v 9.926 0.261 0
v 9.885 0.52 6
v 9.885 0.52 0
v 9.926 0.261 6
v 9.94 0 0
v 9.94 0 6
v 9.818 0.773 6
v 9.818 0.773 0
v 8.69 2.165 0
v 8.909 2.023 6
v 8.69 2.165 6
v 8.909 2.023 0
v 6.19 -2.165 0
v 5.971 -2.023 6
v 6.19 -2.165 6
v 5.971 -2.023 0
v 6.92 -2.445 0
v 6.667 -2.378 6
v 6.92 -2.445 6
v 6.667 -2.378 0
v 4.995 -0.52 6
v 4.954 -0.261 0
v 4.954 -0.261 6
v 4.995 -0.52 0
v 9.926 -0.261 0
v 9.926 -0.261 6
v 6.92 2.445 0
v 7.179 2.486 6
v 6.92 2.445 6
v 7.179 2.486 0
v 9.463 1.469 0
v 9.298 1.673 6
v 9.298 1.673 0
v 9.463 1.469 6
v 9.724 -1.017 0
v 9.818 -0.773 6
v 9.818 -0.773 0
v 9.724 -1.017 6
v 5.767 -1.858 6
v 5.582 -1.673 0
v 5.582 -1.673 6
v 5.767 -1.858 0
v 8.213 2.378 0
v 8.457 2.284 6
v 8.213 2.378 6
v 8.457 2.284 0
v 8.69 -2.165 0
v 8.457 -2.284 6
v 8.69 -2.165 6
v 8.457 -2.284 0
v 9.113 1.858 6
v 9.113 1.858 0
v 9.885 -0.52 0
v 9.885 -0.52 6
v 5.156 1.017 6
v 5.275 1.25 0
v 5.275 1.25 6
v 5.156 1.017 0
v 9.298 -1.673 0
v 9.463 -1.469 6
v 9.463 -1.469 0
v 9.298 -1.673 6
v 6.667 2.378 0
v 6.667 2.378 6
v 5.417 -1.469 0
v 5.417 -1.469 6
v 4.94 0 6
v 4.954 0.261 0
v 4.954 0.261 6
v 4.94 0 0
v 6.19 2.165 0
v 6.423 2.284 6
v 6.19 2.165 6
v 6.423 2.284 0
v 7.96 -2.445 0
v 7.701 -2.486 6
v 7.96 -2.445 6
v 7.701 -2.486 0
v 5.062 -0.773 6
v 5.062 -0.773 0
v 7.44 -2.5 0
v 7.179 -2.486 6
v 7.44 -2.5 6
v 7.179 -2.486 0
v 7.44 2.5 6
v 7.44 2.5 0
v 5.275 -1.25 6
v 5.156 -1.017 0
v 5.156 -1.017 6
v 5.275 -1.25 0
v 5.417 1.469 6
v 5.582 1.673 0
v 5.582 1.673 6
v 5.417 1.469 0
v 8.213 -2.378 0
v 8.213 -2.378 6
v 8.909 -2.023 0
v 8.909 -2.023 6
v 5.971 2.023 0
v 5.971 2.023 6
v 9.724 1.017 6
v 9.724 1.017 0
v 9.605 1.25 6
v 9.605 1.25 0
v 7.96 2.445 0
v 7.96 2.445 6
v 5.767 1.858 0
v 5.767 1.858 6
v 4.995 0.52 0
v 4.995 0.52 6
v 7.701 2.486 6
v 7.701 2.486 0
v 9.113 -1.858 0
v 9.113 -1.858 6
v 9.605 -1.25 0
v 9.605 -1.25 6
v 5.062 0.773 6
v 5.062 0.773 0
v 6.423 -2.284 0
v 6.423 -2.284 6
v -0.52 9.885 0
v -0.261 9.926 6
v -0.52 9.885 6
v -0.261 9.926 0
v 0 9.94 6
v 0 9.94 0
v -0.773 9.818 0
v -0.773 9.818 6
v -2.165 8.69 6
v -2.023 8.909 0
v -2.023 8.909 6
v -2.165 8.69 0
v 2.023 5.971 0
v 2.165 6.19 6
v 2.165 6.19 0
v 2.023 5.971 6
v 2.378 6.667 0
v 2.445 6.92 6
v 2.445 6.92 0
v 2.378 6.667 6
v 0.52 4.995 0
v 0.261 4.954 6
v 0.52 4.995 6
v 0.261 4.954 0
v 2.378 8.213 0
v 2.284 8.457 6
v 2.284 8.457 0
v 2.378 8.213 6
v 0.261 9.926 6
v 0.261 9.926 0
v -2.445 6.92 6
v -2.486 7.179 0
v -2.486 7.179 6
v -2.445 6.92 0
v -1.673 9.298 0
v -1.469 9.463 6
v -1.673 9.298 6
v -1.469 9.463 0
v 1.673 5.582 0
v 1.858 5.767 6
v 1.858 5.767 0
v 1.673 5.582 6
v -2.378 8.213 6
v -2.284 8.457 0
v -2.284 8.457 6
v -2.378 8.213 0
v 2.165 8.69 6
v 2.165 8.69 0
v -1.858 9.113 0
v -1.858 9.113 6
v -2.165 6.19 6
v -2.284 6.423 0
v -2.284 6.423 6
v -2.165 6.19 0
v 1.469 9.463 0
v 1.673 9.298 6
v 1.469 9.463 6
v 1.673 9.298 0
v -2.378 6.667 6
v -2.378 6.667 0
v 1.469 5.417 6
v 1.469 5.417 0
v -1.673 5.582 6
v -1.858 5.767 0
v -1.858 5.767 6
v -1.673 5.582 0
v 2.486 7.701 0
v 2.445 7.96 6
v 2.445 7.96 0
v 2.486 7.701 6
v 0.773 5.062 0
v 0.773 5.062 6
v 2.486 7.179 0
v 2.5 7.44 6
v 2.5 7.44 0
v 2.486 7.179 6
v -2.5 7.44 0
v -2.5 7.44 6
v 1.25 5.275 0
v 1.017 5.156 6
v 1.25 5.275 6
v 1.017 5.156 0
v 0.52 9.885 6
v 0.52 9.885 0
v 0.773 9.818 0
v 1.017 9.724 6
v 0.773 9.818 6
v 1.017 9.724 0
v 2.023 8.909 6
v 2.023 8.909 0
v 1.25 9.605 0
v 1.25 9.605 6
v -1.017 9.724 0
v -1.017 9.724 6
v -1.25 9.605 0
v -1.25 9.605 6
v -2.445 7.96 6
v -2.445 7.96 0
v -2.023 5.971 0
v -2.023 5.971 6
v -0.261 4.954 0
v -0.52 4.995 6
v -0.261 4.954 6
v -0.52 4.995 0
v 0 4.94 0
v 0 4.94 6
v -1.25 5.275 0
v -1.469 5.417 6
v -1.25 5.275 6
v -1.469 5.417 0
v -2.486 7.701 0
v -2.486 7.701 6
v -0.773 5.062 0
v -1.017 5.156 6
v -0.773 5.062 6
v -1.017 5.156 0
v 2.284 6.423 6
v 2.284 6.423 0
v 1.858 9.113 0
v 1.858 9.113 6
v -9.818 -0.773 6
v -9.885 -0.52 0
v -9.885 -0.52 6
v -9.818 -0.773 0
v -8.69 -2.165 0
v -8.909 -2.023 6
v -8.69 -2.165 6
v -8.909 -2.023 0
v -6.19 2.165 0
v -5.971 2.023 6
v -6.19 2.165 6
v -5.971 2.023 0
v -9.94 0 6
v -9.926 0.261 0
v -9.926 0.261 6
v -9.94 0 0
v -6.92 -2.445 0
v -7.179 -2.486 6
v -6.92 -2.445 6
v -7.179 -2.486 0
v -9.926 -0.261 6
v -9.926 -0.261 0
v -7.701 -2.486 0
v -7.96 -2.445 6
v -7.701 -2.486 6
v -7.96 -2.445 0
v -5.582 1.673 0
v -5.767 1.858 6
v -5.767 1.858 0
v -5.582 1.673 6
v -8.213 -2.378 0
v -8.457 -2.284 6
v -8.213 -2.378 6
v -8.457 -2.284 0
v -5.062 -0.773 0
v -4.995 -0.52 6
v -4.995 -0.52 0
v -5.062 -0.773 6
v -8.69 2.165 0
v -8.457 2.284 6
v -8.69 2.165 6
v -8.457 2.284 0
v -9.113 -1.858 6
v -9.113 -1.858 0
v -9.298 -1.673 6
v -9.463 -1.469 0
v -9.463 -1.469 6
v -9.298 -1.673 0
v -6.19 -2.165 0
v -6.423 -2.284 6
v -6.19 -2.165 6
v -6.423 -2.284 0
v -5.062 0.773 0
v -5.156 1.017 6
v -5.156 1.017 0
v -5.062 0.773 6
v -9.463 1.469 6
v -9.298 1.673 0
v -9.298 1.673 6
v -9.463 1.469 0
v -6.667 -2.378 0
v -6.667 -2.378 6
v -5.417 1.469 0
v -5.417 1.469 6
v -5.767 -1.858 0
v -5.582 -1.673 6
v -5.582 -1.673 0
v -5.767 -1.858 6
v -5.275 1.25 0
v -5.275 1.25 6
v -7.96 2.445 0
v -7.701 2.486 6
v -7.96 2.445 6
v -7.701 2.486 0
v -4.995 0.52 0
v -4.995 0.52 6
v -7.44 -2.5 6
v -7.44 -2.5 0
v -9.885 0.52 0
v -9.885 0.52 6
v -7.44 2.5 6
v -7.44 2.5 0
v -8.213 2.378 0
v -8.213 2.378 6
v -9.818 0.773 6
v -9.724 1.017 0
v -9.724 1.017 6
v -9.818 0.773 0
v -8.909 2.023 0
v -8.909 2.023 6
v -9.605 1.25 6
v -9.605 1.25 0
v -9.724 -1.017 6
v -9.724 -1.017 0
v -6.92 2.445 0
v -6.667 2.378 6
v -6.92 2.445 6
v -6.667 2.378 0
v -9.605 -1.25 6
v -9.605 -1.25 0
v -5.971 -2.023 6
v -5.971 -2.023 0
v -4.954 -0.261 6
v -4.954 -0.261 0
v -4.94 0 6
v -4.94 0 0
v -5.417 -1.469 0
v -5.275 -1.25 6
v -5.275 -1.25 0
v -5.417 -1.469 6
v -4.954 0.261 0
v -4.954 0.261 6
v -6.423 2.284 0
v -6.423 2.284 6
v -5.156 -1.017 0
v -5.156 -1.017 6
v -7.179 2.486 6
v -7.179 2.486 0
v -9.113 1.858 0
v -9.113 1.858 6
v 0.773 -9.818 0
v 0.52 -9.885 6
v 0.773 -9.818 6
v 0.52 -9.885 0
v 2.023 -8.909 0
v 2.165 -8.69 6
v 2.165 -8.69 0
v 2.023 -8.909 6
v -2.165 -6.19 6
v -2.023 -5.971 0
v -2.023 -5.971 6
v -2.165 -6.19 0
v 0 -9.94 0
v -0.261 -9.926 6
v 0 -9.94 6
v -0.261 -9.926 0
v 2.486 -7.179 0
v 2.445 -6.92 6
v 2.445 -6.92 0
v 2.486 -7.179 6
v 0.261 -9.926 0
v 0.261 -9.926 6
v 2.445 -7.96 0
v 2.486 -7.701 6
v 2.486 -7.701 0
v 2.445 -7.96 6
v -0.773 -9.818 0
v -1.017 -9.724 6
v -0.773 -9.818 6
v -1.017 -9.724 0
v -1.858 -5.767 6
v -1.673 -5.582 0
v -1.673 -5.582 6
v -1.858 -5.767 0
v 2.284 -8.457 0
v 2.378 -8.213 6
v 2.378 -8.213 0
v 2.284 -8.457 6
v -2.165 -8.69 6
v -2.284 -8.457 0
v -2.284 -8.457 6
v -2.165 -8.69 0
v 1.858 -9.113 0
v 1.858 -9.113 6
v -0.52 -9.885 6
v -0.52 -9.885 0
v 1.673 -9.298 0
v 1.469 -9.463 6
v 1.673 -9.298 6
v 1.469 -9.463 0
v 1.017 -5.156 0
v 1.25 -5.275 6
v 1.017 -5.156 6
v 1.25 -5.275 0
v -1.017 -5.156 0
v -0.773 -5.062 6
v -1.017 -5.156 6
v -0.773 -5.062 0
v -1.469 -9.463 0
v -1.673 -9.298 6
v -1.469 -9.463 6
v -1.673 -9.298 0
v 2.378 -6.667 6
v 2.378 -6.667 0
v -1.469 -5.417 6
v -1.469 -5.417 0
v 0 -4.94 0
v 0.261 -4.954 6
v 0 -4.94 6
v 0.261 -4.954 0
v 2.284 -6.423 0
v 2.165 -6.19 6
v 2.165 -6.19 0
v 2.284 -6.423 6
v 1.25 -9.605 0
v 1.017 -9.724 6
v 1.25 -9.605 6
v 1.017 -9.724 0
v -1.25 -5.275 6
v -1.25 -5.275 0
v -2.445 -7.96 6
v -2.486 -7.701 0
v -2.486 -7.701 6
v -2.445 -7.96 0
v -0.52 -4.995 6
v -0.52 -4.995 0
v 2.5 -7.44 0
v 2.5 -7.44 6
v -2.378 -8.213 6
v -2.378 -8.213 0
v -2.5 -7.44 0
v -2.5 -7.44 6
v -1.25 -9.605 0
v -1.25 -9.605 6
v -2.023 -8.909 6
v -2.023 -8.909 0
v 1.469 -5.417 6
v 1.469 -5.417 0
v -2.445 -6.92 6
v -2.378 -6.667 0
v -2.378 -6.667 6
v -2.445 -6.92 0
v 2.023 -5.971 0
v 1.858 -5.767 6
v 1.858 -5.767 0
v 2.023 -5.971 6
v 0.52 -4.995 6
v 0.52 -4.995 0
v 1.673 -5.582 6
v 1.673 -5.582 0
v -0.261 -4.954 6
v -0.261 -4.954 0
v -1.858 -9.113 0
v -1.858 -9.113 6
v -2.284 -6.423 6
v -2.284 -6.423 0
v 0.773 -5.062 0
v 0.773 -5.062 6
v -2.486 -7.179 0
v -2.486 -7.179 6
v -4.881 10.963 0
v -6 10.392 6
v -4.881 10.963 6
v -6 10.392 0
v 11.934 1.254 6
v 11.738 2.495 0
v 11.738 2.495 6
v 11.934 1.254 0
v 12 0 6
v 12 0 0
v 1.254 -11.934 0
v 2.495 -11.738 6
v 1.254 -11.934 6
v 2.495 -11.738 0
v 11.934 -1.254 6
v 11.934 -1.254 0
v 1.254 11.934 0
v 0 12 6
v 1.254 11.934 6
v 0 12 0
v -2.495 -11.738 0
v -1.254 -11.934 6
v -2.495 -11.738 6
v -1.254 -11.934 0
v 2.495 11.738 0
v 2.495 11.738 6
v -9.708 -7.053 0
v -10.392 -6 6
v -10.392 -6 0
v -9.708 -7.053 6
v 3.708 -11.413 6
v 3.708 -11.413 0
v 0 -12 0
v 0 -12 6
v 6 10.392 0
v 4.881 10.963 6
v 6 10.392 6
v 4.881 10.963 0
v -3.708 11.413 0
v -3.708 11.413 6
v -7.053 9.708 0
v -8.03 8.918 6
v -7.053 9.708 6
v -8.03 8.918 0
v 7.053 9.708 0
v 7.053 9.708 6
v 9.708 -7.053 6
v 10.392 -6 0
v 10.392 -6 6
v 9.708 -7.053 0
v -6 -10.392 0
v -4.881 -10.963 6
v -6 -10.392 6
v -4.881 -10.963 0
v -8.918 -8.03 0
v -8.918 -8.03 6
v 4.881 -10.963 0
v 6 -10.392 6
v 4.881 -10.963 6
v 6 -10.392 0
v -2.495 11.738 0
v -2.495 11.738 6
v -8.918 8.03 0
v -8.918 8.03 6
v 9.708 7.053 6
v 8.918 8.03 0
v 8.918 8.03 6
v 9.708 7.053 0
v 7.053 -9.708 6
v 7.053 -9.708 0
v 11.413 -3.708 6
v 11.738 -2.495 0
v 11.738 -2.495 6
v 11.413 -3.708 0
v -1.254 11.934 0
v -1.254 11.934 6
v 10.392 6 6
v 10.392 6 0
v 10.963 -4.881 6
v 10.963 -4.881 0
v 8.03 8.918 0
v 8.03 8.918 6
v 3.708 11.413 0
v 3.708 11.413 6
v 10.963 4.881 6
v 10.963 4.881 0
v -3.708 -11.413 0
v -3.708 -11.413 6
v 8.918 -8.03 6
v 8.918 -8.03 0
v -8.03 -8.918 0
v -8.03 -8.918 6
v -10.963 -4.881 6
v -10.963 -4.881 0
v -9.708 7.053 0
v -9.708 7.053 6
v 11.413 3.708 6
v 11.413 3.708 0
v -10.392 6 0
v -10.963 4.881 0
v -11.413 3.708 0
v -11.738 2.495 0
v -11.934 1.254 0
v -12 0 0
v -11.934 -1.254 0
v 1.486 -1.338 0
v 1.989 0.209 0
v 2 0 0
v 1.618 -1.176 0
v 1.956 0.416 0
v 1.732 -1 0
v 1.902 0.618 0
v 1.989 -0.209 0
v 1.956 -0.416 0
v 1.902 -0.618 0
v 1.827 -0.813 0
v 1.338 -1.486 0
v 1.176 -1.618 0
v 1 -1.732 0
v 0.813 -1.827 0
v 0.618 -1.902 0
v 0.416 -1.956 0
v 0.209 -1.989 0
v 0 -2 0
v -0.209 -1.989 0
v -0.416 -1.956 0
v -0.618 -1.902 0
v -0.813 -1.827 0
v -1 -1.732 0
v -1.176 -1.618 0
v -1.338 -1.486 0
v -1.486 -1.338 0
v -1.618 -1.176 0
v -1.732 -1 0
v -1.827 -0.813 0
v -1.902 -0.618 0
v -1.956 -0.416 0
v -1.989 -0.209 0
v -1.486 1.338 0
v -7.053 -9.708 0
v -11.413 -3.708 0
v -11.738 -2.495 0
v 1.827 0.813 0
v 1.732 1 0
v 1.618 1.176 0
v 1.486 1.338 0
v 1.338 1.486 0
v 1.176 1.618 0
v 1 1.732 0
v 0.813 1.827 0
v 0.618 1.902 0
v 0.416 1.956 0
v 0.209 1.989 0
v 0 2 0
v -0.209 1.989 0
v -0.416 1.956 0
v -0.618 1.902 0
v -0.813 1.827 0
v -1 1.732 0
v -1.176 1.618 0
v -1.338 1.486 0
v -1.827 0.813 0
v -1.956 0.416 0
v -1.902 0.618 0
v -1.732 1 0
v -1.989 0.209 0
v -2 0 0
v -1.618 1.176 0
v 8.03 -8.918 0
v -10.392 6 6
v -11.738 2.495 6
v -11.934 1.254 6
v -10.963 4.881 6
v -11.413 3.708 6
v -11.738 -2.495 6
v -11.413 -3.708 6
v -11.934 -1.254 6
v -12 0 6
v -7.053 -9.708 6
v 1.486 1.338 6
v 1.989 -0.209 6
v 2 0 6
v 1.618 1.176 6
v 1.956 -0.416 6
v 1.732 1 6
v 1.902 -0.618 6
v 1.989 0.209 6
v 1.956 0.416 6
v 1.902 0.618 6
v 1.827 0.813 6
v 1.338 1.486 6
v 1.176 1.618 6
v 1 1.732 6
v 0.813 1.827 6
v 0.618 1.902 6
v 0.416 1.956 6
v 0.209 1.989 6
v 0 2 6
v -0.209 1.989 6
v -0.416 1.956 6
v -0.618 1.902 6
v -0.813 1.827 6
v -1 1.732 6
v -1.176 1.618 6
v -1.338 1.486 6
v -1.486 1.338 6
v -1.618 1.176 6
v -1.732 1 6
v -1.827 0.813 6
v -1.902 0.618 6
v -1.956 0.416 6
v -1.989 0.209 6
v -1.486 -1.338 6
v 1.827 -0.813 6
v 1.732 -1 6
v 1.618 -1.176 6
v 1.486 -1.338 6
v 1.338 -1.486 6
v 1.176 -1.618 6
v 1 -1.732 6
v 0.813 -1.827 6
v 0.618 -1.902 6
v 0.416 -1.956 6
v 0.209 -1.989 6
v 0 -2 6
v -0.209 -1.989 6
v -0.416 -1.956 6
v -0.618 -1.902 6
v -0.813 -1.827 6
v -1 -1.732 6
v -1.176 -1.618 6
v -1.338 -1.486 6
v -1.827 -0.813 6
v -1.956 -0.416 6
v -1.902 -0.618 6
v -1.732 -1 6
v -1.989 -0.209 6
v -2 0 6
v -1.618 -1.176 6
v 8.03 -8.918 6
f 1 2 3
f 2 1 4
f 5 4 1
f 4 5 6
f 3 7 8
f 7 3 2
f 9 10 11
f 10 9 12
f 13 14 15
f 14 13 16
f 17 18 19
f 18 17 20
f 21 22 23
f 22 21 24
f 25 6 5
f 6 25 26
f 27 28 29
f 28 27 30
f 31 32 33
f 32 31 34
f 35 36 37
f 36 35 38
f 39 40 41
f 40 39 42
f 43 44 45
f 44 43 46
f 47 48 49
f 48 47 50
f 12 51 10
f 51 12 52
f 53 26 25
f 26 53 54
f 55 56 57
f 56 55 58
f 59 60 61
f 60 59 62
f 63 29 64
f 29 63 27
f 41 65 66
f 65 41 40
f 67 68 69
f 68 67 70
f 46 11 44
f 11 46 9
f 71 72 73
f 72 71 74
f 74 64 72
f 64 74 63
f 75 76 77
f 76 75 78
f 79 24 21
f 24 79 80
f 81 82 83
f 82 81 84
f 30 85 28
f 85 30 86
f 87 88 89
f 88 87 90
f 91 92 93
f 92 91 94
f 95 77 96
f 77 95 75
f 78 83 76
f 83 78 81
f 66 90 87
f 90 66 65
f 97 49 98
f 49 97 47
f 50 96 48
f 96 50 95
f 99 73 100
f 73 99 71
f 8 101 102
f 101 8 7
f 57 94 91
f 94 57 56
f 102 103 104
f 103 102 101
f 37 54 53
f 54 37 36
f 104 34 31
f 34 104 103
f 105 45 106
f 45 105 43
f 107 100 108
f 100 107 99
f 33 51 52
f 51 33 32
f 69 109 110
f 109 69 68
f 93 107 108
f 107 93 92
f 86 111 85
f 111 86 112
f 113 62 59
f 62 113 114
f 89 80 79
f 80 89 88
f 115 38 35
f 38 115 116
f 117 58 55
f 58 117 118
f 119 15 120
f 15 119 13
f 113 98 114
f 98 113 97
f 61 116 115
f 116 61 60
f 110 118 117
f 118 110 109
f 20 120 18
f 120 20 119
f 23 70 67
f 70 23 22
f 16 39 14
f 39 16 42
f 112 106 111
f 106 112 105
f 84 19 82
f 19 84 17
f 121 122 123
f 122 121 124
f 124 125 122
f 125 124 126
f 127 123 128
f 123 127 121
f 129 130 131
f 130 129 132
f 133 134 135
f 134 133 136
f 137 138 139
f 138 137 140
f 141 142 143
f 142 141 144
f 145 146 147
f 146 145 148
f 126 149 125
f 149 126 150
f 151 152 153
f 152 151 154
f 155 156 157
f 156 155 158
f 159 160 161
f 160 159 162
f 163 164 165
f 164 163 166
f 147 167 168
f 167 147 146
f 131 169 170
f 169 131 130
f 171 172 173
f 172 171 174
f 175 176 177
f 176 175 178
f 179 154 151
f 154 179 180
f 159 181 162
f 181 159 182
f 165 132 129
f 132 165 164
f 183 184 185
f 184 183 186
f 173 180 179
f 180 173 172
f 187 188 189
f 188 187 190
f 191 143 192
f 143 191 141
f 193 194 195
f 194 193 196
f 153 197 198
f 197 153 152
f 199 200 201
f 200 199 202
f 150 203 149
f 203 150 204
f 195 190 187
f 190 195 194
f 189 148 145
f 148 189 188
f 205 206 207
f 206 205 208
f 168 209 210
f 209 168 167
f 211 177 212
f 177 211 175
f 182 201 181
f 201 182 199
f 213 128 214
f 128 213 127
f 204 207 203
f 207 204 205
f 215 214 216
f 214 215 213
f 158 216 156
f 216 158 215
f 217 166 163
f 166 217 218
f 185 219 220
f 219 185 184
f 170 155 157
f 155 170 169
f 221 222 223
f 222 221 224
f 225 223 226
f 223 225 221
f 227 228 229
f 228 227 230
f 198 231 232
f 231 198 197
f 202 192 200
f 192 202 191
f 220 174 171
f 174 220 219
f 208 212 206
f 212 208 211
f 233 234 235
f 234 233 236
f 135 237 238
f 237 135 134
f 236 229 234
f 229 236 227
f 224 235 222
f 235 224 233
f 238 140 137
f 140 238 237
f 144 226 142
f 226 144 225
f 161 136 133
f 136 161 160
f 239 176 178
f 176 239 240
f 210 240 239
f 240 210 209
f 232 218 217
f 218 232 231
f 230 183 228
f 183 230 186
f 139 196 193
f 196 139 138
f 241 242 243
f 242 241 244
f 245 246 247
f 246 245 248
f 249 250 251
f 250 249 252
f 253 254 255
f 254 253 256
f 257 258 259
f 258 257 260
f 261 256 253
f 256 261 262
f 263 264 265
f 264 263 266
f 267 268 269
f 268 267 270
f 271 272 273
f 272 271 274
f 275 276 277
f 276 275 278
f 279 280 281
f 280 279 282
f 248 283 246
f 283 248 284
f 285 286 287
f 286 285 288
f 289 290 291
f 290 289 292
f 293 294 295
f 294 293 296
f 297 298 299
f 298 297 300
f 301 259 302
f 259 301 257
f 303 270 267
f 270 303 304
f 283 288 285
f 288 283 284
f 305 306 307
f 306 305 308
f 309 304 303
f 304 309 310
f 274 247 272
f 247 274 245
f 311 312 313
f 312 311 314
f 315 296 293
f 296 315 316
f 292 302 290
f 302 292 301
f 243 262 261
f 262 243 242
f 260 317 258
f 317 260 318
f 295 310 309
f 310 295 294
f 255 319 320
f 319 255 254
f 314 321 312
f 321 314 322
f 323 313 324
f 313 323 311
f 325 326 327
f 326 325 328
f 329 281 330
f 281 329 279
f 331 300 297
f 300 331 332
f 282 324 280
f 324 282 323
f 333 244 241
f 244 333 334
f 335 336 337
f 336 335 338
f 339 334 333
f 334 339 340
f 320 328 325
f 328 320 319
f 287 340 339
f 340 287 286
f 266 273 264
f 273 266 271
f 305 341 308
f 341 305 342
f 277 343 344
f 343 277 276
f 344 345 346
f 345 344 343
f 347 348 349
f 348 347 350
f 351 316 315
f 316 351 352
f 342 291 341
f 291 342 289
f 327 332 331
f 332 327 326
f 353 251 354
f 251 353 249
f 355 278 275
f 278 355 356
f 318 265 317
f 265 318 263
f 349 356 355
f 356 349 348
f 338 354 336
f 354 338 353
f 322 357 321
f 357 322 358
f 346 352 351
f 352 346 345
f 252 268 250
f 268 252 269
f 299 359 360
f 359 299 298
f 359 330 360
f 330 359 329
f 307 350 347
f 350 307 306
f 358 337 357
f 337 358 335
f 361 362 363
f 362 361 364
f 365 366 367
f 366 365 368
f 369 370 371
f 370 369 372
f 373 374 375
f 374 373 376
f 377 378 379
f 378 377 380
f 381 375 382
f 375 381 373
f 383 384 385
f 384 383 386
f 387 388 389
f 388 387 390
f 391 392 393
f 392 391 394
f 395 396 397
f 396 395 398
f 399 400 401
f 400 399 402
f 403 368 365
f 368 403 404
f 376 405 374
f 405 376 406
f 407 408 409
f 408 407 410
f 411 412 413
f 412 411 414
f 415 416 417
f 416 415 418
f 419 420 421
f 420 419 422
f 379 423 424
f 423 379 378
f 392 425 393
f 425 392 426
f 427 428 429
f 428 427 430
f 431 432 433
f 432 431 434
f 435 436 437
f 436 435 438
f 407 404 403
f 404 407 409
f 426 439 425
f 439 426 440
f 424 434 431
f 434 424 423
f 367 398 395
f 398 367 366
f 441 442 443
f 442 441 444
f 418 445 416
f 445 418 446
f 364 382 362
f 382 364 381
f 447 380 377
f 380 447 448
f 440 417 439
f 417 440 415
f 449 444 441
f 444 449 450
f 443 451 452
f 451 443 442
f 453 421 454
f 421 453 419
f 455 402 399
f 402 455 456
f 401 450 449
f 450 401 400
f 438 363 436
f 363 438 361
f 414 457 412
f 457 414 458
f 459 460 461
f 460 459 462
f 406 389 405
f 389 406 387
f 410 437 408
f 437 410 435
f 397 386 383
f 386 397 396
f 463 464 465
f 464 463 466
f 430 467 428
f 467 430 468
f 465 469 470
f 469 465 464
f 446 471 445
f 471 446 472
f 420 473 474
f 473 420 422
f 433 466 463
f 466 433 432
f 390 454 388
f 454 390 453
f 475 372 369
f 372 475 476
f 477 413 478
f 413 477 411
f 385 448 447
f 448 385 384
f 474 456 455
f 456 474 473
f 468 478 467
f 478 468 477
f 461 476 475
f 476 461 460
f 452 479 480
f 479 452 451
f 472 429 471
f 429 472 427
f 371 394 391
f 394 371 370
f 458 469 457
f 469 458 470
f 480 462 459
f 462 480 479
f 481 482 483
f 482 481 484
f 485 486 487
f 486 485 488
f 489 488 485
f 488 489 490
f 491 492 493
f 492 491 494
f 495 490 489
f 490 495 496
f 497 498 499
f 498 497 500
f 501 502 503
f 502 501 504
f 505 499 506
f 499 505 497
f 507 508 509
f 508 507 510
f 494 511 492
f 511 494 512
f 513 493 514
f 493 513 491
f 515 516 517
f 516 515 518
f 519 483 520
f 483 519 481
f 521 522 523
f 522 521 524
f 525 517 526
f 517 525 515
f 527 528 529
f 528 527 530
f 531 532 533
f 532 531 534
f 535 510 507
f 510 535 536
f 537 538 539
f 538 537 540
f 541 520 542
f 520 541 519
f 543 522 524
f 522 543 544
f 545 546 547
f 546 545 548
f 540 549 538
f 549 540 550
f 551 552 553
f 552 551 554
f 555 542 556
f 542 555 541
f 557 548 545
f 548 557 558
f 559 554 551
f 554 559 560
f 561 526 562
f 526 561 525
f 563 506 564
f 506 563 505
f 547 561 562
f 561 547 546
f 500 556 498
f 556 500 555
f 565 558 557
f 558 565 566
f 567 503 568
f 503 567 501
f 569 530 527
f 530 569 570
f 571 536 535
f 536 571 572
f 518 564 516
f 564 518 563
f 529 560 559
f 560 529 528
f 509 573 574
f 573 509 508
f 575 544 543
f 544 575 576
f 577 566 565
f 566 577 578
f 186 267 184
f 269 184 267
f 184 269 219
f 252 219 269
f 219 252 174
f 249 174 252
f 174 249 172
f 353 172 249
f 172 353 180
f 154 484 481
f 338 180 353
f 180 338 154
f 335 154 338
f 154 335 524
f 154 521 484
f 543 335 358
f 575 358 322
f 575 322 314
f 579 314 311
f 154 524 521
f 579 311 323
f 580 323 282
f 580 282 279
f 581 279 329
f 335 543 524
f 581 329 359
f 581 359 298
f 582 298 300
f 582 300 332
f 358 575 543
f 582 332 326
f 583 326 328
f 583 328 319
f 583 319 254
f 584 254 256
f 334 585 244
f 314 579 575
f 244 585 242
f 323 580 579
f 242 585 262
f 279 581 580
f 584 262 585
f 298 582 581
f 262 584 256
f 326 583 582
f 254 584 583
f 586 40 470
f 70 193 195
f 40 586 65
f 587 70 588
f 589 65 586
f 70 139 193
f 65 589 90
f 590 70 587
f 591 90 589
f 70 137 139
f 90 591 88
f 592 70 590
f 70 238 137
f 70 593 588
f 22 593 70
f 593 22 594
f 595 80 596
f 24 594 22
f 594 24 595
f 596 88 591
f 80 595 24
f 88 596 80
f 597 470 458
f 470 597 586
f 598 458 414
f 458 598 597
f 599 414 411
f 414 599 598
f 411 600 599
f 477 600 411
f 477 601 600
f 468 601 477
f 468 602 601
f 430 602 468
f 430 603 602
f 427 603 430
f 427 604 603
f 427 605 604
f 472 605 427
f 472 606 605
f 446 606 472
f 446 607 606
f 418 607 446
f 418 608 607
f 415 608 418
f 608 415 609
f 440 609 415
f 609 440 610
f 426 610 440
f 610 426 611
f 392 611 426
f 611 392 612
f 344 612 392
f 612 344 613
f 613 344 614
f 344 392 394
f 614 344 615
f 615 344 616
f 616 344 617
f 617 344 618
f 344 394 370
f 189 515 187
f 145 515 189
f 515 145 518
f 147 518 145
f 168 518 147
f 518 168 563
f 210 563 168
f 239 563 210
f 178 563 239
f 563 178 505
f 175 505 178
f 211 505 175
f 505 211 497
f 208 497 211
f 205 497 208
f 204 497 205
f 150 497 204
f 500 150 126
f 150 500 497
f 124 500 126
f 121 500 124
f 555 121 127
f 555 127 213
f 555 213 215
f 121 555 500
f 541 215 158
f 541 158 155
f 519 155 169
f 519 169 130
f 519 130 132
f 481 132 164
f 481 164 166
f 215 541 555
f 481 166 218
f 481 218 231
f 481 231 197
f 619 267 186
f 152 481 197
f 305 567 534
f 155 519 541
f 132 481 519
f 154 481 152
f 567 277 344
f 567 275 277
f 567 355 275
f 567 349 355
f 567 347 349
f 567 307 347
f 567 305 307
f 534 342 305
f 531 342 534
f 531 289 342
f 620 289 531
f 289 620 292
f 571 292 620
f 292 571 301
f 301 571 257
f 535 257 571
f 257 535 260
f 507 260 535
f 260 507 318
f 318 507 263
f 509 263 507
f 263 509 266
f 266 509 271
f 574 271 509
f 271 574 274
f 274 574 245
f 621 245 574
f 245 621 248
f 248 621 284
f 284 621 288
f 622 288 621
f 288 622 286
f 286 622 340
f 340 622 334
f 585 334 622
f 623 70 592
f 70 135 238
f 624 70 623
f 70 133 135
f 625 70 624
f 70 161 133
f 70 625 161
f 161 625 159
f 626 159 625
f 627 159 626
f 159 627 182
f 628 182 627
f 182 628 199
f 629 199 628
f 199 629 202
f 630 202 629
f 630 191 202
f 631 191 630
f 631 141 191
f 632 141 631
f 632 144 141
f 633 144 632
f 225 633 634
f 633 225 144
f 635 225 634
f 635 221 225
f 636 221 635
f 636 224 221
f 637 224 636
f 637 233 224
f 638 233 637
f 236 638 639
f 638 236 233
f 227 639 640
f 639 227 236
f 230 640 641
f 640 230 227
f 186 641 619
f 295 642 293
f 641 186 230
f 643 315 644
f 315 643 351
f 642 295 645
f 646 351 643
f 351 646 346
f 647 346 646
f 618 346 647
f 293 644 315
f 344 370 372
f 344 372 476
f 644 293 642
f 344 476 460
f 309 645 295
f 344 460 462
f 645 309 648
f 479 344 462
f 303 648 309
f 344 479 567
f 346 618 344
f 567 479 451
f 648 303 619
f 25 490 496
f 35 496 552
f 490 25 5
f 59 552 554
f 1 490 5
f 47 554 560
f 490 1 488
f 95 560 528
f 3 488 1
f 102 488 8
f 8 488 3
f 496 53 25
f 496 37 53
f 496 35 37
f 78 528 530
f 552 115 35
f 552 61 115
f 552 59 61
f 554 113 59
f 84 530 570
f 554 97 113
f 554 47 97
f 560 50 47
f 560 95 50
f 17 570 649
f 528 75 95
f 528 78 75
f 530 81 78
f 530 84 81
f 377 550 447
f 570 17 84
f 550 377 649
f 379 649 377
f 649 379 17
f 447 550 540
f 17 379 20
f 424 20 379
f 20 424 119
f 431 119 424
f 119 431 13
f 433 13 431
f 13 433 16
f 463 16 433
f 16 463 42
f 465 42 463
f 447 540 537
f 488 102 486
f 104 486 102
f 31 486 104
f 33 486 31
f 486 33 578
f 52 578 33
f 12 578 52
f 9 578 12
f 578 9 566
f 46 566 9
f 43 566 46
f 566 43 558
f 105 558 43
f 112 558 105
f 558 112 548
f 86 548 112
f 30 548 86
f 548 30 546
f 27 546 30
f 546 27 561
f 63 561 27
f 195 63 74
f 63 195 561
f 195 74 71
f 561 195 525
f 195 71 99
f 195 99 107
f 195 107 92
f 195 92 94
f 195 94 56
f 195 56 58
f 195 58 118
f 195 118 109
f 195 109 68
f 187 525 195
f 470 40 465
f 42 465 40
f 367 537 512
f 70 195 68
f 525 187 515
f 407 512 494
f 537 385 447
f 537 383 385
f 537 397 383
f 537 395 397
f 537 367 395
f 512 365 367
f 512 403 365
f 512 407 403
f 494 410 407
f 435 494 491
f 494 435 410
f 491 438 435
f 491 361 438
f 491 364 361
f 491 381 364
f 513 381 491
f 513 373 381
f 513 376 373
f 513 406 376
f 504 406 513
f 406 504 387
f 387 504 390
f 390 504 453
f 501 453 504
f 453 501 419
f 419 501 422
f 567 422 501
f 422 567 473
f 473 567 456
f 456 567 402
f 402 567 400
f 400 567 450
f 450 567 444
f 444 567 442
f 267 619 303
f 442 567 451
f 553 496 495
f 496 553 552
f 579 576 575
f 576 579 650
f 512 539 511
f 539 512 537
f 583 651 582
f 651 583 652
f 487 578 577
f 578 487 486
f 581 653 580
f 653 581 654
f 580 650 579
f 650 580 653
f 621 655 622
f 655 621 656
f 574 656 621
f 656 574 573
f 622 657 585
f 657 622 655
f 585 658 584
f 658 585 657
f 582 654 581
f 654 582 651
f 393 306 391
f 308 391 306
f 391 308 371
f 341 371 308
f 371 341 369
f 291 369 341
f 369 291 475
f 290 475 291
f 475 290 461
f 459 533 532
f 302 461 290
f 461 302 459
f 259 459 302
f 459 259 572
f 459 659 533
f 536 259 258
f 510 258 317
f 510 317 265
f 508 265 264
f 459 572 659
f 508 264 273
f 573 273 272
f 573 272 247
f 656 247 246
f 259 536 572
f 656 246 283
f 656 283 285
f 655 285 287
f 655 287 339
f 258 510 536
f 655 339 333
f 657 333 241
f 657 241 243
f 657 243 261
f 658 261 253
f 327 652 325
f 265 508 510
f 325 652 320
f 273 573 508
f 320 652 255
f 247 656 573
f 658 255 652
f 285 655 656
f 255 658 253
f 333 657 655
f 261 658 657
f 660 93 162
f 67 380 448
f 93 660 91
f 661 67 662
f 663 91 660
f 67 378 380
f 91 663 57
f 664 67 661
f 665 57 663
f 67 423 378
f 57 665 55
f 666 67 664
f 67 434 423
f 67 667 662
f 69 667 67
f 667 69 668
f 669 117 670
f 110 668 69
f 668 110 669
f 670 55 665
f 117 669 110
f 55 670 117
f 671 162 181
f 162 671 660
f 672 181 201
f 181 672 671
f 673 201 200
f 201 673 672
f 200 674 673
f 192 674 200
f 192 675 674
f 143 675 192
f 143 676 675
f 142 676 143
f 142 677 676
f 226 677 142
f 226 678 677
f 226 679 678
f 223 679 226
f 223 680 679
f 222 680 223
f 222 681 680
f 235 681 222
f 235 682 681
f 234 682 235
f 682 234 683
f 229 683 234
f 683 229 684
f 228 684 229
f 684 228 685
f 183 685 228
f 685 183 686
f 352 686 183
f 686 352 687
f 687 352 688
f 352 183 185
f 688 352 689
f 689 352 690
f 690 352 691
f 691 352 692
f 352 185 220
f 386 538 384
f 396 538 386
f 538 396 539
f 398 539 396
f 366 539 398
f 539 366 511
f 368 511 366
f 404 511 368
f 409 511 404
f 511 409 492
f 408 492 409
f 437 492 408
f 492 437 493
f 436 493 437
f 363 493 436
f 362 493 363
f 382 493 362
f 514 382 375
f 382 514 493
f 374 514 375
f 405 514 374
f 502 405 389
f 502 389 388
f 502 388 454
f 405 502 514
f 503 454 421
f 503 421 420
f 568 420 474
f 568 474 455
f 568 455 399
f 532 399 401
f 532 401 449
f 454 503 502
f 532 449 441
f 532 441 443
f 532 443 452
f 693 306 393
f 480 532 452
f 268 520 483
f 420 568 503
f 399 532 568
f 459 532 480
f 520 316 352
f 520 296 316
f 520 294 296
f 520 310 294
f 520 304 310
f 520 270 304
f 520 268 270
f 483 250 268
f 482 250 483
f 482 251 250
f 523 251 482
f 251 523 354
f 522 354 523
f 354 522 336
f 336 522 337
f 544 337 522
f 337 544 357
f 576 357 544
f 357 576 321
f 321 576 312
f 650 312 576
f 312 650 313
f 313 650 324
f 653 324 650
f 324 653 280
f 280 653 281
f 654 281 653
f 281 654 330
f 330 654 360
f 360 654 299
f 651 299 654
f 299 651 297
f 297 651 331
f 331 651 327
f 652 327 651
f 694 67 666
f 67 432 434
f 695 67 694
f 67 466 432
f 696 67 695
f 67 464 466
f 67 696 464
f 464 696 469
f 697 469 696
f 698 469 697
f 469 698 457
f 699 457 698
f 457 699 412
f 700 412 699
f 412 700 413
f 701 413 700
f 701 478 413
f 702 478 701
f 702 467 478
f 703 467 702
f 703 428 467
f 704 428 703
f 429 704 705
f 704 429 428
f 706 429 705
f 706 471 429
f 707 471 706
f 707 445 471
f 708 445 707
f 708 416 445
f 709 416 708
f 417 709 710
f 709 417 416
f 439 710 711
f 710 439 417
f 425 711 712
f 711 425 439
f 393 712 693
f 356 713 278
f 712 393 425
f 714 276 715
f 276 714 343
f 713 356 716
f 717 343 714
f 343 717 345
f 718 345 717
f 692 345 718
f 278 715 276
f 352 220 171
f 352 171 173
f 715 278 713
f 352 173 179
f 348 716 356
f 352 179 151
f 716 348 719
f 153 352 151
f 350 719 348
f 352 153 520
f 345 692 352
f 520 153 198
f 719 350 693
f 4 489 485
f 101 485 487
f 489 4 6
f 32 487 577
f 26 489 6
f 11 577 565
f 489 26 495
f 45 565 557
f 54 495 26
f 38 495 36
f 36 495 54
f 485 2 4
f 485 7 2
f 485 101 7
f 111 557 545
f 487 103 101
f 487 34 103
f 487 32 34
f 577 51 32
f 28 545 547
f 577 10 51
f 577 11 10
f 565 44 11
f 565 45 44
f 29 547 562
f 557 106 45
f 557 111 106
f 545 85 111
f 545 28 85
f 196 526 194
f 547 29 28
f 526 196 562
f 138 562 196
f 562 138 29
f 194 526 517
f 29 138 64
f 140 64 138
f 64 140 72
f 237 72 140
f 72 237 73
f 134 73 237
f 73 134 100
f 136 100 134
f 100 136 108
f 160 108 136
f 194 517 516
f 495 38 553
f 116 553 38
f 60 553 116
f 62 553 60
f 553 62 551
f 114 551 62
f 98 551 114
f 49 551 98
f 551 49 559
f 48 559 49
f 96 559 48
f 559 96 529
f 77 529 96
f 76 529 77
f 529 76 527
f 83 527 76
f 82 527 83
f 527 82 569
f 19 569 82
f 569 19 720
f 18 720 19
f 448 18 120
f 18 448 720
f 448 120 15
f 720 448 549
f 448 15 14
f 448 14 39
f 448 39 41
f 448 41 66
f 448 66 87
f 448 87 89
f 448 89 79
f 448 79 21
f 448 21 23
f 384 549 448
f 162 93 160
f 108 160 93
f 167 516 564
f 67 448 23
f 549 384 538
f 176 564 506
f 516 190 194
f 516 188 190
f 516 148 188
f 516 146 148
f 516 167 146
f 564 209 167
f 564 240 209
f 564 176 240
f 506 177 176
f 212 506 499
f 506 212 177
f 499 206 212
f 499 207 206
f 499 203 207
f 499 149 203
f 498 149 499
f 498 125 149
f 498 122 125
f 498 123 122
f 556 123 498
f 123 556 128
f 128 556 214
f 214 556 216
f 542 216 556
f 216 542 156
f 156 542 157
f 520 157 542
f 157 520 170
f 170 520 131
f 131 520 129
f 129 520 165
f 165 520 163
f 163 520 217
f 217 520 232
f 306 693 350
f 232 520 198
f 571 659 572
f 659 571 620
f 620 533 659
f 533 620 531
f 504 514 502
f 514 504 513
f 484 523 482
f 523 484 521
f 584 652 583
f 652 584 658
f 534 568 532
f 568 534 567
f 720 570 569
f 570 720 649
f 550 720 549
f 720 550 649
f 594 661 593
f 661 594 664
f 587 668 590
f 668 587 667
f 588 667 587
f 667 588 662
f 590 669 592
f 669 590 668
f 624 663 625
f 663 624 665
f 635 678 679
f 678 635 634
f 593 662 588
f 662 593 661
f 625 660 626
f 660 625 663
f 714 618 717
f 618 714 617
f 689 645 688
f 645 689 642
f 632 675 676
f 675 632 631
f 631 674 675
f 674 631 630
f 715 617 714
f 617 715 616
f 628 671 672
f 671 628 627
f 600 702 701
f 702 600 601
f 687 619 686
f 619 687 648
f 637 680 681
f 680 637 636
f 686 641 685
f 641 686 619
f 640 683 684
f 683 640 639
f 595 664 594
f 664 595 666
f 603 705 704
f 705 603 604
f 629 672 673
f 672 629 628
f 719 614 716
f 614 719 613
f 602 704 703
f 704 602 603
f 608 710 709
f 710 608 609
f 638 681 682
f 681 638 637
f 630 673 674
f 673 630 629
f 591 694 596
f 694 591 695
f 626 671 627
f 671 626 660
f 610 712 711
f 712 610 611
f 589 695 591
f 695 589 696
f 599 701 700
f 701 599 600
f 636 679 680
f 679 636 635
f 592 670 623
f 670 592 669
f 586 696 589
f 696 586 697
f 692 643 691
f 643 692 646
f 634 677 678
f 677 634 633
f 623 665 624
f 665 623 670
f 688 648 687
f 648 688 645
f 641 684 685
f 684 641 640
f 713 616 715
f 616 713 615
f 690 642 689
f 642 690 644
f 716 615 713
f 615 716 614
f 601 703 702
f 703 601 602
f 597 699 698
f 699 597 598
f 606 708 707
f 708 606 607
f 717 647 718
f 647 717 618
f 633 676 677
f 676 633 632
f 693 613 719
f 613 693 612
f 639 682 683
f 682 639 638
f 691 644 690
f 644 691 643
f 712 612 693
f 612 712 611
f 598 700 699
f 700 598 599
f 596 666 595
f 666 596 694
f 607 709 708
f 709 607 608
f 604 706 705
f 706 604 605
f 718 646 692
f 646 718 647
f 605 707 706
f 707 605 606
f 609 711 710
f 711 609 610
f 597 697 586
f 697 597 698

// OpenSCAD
// Lightweight sprocket blank.
$fn = 60;
eps = 0.02;
bore_d = 4;
outer_d = 24;
spoke_holes = 4;
thickness = 6;
difference() { cylinder(d=outer_d,h=thickness); translate([0,0,-eps]) cylinder(d=bore_d,h=thickness+2*eps); for(i=[0:spoke_holes-1]) rotate([0,0,i*360/spoke_holes]) translate([outer_d*0.31,0,-eps]) cylinder(d=5,h=thickness+2*eps); }
